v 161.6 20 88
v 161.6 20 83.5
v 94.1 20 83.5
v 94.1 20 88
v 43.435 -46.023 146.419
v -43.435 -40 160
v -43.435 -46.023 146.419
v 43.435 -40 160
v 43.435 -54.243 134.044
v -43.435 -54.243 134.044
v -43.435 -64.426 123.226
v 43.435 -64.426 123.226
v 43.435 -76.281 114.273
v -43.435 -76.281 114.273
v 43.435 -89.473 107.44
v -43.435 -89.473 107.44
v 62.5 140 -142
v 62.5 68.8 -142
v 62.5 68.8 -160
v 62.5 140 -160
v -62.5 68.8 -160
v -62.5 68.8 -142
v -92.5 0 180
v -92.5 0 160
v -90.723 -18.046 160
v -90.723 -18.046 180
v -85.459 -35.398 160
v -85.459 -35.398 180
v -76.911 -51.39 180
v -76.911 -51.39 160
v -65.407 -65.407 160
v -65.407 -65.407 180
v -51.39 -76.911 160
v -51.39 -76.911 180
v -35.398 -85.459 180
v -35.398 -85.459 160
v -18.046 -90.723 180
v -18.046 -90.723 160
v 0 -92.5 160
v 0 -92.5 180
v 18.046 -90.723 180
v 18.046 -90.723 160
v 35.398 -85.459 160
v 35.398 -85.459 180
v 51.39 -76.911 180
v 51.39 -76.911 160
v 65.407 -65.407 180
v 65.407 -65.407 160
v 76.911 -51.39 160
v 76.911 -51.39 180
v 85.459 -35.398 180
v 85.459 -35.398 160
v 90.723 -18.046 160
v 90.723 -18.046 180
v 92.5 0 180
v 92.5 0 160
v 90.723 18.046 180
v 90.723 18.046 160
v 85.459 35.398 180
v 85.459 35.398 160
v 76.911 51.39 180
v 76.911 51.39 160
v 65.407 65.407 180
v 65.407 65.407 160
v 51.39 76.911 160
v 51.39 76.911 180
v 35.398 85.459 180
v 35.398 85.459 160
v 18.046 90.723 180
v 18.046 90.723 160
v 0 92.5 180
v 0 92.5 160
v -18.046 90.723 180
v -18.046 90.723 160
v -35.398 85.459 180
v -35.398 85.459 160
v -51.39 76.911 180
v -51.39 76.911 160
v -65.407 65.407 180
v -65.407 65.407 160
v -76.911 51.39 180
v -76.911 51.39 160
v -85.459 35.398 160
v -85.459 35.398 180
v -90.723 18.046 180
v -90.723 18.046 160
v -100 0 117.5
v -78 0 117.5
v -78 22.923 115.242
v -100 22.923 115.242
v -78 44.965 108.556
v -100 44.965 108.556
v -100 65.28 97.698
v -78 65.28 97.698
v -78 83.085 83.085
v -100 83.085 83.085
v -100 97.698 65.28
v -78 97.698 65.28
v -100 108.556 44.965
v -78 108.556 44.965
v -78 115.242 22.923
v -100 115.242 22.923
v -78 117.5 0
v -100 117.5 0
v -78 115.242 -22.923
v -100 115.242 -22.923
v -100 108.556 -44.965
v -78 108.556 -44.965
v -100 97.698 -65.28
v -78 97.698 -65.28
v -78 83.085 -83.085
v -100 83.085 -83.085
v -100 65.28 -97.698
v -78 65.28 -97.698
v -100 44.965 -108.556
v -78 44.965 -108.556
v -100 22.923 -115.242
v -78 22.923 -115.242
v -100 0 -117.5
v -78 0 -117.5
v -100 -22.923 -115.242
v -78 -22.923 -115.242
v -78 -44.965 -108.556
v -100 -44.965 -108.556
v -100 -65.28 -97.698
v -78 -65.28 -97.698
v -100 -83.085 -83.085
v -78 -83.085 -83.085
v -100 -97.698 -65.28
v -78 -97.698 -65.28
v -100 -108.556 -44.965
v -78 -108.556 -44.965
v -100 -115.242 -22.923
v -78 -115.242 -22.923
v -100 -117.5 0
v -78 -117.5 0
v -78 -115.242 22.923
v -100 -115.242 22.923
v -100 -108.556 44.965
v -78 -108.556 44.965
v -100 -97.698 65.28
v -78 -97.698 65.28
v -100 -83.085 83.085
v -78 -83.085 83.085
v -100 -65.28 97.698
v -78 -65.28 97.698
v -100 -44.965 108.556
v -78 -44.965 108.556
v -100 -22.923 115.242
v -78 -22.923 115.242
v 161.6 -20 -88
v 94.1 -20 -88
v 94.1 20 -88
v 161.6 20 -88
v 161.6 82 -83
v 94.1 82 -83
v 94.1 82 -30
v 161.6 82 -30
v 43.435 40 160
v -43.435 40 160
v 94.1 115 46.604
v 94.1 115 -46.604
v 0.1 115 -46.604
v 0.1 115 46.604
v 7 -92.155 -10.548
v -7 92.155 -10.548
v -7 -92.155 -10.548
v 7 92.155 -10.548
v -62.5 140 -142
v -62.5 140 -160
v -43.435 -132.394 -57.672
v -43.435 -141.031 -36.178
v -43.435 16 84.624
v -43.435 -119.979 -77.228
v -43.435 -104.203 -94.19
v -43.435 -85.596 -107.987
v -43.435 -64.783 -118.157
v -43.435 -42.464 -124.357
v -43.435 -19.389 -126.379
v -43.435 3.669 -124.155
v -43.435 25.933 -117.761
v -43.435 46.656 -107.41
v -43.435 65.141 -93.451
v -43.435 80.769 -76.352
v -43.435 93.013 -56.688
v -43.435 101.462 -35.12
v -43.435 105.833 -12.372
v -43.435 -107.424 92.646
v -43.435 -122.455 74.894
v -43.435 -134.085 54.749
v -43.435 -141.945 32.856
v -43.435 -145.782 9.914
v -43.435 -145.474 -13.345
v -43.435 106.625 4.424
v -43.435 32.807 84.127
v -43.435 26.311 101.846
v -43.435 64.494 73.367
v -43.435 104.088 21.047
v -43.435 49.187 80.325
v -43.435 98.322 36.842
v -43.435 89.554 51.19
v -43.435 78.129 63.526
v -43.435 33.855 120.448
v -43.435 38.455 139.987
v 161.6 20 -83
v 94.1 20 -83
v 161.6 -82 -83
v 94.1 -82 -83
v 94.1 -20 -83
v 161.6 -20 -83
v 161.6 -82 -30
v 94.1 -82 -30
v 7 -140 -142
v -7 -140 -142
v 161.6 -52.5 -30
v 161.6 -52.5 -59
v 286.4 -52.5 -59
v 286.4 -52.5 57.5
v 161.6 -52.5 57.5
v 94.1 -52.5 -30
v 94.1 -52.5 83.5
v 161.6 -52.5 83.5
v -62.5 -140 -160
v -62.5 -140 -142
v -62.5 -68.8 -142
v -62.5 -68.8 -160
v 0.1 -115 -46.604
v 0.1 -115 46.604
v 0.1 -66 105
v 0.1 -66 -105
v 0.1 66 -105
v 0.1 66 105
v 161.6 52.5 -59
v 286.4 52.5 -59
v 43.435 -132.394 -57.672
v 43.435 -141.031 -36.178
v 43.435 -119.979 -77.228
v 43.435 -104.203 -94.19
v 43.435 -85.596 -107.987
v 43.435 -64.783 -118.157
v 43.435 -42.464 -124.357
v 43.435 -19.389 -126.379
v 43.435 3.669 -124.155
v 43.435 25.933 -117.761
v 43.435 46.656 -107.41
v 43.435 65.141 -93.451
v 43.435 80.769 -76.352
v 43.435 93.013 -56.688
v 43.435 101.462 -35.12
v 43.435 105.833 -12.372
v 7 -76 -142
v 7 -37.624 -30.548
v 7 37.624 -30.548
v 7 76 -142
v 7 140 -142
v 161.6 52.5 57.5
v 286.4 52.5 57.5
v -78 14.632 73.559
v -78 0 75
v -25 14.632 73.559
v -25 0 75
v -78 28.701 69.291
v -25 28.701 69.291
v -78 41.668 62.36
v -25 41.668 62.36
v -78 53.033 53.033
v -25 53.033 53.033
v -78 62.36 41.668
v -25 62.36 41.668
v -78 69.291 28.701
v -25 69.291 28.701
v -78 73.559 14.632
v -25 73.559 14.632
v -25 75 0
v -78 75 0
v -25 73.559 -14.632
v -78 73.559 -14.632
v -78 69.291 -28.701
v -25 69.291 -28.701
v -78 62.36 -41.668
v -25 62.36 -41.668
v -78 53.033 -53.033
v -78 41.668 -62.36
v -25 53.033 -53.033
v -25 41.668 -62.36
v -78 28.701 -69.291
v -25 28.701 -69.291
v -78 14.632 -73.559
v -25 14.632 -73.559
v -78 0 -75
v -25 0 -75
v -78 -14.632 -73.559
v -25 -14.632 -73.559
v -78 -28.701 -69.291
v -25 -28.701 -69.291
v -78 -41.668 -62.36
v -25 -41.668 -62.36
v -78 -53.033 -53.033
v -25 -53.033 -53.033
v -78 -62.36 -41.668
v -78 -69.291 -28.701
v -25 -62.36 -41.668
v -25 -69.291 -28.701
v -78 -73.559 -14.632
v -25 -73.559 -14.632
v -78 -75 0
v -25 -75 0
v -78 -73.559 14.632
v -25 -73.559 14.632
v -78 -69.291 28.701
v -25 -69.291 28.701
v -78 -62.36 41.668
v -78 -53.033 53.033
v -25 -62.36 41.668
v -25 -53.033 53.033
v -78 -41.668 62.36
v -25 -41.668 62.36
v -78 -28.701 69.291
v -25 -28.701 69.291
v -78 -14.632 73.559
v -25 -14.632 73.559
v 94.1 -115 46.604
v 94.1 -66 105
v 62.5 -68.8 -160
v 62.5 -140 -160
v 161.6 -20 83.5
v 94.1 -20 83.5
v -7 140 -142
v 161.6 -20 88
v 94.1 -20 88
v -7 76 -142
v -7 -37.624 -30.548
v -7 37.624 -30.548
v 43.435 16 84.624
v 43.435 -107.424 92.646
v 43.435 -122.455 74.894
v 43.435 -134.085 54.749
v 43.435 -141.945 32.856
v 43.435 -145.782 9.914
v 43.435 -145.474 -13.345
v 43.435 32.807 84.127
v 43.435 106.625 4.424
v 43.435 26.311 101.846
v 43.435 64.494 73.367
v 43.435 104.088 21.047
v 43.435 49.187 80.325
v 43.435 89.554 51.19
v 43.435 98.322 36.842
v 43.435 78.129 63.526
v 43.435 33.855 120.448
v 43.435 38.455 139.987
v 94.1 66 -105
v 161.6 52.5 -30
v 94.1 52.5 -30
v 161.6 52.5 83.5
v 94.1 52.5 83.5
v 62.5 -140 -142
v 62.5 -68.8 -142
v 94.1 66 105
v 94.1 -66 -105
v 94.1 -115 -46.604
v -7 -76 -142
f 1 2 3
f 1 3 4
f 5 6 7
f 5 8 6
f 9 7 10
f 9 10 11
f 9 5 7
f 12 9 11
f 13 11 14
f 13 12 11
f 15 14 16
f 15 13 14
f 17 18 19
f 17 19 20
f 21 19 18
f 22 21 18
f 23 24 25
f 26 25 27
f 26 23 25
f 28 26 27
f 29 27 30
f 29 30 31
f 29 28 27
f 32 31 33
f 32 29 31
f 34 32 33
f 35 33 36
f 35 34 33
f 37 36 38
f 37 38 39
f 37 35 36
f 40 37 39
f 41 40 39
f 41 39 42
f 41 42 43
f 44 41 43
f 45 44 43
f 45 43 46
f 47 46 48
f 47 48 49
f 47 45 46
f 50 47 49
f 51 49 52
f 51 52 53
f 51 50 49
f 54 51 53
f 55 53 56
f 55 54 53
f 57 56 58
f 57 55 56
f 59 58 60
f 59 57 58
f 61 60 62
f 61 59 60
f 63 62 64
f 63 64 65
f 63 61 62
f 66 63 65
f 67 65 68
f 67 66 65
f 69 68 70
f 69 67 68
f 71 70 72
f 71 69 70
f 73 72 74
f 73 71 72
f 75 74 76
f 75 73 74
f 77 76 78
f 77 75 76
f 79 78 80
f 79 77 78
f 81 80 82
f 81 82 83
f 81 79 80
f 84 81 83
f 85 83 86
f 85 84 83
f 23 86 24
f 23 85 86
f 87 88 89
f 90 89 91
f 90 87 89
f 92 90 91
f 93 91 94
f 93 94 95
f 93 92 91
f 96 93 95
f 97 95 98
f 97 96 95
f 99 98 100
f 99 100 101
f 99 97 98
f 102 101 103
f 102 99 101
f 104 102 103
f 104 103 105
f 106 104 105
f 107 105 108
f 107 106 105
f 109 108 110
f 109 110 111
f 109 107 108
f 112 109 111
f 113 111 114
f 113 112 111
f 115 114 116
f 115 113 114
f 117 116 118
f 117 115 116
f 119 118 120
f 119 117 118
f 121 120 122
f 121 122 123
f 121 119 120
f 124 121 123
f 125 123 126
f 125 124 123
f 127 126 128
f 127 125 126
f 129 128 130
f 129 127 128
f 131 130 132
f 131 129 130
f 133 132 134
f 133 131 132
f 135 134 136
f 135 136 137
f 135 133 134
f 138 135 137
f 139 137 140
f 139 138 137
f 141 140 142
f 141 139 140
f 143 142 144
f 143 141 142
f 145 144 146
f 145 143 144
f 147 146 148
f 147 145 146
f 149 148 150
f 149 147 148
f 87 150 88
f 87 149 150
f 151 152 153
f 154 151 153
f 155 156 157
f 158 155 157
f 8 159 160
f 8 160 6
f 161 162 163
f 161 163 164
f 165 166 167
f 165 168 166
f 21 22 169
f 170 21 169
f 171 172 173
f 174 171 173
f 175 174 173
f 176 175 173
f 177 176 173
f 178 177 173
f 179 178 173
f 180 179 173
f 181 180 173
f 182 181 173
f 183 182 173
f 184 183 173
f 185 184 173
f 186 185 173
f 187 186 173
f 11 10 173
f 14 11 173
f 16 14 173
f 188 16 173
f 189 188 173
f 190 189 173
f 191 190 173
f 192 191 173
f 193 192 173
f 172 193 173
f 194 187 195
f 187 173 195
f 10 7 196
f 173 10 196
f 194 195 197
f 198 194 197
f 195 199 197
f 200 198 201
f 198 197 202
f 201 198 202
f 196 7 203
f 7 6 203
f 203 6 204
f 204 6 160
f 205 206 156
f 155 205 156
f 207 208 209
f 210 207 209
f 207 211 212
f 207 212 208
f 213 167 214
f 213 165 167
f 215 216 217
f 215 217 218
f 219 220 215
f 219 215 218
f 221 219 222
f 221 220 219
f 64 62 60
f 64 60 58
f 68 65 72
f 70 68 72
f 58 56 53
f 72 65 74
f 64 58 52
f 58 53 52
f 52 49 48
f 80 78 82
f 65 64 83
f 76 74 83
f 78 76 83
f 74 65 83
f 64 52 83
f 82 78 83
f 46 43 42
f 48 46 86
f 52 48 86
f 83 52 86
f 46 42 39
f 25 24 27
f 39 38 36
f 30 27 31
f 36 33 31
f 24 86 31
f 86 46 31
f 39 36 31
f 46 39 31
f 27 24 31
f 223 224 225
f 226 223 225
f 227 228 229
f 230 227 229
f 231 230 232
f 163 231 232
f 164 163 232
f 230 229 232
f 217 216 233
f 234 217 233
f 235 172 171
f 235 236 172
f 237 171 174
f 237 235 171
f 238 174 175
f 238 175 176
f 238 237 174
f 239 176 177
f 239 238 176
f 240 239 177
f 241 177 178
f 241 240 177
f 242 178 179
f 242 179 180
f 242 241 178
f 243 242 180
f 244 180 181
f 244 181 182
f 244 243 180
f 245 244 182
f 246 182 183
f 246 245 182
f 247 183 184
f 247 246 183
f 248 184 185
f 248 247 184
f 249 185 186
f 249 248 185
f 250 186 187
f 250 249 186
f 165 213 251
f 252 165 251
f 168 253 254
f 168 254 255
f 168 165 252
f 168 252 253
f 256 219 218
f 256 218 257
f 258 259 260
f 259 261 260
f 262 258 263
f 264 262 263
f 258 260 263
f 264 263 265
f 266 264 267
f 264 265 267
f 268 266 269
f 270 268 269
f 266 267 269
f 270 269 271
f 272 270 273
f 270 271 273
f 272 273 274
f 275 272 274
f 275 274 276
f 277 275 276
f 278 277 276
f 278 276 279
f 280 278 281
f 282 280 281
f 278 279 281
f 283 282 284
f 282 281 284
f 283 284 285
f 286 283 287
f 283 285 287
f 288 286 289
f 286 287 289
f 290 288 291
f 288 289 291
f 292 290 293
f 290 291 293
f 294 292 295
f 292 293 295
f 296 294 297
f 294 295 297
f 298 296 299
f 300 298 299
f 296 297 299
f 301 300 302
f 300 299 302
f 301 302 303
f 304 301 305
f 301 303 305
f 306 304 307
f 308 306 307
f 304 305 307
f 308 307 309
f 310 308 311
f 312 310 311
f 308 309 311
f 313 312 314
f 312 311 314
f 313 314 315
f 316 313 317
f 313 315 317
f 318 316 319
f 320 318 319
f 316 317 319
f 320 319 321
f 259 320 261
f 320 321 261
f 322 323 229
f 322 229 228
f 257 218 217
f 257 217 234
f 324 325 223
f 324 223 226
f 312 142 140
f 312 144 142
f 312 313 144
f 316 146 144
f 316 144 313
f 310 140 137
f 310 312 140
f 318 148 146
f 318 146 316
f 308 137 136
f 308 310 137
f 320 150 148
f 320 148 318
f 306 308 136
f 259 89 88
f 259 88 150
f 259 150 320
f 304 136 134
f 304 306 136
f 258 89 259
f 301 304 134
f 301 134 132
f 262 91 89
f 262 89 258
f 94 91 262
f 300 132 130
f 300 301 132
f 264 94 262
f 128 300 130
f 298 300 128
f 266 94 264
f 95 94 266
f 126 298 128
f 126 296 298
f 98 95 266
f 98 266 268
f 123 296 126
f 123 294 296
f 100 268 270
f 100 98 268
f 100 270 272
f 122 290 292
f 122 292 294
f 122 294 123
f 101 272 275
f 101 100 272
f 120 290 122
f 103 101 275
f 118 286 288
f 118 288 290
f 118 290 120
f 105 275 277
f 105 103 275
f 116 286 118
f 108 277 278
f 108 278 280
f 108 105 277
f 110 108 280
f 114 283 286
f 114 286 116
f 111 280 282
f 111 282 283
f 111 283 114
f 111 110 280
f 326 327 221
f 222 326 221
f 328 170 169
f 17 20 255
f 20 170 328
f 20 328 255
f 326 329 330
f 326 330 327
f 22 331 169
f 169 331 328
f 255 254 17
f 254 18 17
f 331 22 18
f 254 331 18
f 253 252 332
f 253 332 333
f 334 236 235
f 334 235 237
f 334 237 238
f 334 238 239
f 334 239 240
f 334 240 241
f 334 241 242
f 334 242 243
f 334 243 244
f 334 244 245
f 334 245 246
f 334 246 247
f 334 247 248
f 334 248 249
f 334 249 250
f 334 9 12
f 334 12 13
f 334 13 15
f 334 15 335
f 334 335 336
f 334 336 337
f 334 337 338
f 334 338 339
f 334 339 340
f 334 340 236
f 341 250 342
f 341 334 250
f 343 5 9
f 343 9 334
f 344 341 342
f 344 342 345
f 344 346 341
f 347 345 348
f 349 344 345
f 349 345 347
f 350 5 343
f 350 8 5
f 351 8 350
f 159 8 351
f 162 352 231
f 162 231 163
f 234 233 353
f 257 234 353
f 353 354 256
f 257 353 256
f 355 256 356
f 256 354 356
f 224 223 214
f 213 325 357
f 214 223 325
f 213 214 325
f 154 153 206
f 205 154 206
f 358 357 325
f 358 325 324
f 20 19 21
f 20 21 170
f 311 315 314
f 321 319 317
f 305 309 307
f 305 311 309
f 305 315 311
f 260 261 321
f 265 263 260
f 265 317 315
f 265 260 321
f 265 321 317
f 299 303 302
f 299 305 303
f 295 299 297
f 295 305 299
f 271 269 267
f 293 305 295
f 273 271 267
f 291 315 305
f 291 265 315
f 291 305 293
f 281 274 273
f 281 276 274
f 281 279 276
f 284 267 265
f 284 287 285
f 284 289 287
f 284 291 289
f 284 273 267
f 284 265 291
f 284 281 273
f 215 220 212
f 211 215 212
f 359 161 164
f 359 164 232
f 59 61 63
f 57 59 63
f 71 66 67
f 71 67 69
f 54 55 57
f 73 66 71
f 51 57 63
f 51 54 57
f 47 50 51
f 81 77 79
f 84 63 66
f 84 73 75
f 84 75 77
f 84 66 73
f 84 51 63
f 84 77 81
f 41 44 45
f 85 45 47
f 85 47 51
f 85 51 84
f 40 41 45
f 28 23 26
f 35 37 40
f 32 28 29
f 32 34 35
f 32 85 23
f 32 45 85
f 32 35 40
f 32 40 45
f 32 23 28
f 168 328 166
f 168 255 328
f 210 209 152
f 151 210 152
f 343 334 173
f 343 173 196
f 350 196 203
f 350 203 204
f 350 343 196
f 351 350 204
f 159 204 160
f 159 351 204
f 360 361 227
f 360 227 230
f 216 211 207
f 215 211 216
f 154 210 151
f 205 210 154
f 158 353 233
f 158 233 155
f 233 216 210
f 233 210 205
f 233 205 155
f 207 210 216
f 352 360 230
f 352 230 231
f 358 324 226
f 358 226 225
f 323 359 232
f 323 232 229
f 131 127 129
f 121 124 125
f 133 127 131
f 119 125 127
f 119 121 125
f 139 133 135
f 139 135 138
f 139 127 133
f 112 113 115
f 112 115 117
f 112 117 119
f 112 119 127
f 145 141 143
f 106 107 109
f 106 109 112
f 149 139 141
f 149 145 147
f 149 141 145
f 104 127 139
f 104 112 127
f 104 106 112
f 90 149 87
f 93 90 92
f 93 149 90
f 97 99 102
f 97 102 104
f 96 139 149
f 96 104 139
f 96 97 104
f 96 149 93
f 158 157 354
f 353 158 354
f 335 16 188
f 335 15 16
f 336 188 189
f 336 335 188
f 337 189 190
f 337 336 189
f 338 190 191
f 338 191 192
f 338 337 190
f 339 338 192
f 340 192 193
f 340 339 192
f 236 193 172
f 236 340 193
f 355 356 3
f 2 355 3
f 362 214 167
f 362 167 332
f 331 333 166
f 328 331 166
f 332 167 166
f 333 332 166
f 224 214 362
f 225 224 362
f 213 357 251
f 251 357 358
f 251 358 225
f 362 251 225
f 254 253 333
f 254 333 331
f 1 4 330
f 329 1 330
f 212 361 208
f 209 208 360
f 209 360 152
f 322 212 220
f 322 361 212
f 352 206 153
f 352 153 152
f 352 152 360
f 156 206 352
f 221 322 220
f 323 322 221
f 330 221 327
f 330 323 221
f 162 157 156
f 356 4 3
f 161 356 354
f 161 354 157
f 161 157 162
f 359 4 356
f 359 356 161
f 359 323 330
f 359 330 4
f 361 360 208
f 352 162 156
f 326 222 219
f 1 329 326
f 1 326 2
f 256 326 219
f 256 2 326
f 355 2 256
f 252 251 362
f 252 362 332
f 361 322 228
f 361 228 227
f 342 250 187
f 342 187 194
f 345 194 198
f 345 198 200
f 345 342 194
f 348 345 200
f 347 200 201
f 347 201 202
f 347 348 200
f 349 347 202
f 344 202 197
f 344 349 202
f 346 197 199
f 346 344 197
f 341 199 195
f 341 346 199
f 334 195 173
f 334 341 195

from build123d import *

# Parameters (mm, degrees)
F0_W      = 53
F0_H      = 75
F2_W      = 92.5
F2_H      = 20
F5_DEPTH  = 7
F6_W      = 71.2
F6_H      = 18
F7_DEPTH  = 62.5
F8_W      = 71.2
F8_H      = 18
F9_DEPTH  = 62.5
F11_DEPTH = 43.435
F14_DEPTH = 94
F16_DEPTH = 67.5
F18_W     = 105
F18_H     = 116.5
F19_DEPTH = 124.8


with BuildPart() as f1:
    # F0 (on Front) → F1 (revolve)
    with BuildSketch(Plane.XZ):
        with Locations((-51.5, 37.5)):
            Rectangle(F0_W, F0_H)
        Polygon((-100, 0), (-78, 0), (-78, 75), (-78, 117.5), (-100, 117.5), align=None)
    revolve(axis=Axis((-62.5, 0, 0), (-1, 0, 0)))


with BuildPart() as f3:
    # F2 (on Front) → F3 (revolve)
    with BuildSketch(Plane.XZ):
        with Locations((-46.25, 170)):
            Rectangle(F2_W, F2_H)
    revolve(axis=Axis((0, 0, 170), (0, 0, 1)))


with BuildPart() as f5:
    # F4 (on Right) → F5 (new body, symmetric)
    with BuildSketch(Plane.YZ):
        Polygon((-92.155384, -10.547998), (-140, -142), (-76, -142), (-37.623998, -30.547998), (37.623998, -30.547998), (76, -142), (140, -142), (92.155384, -10.547998), align=None)
    extrude(amount=F5_DEPTH, both=True)

    # F6 (on Right) → F7 (join, symmetric)
    with BuildSketch(Plane.YZ):
        with Locations((104.4, -151)):
            Rectangle(F6_W, F6_H)
    extrude(amount=F7_DEPTH, both=True)

    # F8 (on Right) → F9 (join, symmetric)
    with BuildSketch(Plane.YZ):
        with Locations((-104.4, -151)):
            Rectangle(F8_W, F8_H)
    extrude(amount=F9_DEPTH, both=True)


with BuildPart() as f11:
    # F10 (on Right) → F11 (new body, symmetric)
    with BuildSketch(Plane.YZ):
        with BuildLine():
            ThreePointArc((-141.031066, -36.178144), (-7.808853, -125.796422), (105.832975, -12.371871))
            ThreePointArc((105.832975, -12.371871), (84.147849, 57.641816), (16, 84.623878))
            ThreePointArc((16, 84.623878), (33.855181, 120.447631), (40, 160))
            Line((40, 160), (-40, 160))
            ThreePointArc((-40, 160), (-59.105853, 128.419799), (-89.473282, 107.439762))
            ThreePointArc((-89.473282, 107.439762), (-138.505183, 43.97847), (-141.031066, -36.178144))
        make_face()
    extrude(amount=F11_DEPTH, both=True)


with BuildPart() as f14:
    # F13 (on offset) → F14 (new body)
    with BuildSketch(Plane.YZ.offset(94.1)):
        Polygon((115, 46.604074), (66, 105), (0, 105), (-66, 105), (-115, 46.604074), (-115, 0), (-115, -46.604074), (-66, -105), (0, -105), (66, -105), (115, -46.604074), (115, 0), align=None)
    extrude(amount=-F14_DEPTH)

    # F15 (on offset) → F16 (join)
    with BuildSketch(Plane.YZ.offset(94.1)):
        Polygon((20, 88), (-20, 88), (-20, 83.5), (-52.5, 83.5), (-52.5, -30), (-82, -30), (-82, -83), (-20, -83), (-20, -88), (20, -88), (20, -83), (82, -83), (82, -30), (52.5, -30), (52.5, 83.5), (20, 83.5), align=None)
    extrude(amount=F16_DEPTH)

    # F18 (on offset) → F19 (join)
    with BuildSketch(Plane.YZ.offset(161.6)):
        with Locations((0, -0.75)):
            Rectangle(F18_W, F18_H)
    extrude(amount=F19_DEPTH)


solid = Compound([f1.part, f3.part, f5.part, f11.part, f14.part])
